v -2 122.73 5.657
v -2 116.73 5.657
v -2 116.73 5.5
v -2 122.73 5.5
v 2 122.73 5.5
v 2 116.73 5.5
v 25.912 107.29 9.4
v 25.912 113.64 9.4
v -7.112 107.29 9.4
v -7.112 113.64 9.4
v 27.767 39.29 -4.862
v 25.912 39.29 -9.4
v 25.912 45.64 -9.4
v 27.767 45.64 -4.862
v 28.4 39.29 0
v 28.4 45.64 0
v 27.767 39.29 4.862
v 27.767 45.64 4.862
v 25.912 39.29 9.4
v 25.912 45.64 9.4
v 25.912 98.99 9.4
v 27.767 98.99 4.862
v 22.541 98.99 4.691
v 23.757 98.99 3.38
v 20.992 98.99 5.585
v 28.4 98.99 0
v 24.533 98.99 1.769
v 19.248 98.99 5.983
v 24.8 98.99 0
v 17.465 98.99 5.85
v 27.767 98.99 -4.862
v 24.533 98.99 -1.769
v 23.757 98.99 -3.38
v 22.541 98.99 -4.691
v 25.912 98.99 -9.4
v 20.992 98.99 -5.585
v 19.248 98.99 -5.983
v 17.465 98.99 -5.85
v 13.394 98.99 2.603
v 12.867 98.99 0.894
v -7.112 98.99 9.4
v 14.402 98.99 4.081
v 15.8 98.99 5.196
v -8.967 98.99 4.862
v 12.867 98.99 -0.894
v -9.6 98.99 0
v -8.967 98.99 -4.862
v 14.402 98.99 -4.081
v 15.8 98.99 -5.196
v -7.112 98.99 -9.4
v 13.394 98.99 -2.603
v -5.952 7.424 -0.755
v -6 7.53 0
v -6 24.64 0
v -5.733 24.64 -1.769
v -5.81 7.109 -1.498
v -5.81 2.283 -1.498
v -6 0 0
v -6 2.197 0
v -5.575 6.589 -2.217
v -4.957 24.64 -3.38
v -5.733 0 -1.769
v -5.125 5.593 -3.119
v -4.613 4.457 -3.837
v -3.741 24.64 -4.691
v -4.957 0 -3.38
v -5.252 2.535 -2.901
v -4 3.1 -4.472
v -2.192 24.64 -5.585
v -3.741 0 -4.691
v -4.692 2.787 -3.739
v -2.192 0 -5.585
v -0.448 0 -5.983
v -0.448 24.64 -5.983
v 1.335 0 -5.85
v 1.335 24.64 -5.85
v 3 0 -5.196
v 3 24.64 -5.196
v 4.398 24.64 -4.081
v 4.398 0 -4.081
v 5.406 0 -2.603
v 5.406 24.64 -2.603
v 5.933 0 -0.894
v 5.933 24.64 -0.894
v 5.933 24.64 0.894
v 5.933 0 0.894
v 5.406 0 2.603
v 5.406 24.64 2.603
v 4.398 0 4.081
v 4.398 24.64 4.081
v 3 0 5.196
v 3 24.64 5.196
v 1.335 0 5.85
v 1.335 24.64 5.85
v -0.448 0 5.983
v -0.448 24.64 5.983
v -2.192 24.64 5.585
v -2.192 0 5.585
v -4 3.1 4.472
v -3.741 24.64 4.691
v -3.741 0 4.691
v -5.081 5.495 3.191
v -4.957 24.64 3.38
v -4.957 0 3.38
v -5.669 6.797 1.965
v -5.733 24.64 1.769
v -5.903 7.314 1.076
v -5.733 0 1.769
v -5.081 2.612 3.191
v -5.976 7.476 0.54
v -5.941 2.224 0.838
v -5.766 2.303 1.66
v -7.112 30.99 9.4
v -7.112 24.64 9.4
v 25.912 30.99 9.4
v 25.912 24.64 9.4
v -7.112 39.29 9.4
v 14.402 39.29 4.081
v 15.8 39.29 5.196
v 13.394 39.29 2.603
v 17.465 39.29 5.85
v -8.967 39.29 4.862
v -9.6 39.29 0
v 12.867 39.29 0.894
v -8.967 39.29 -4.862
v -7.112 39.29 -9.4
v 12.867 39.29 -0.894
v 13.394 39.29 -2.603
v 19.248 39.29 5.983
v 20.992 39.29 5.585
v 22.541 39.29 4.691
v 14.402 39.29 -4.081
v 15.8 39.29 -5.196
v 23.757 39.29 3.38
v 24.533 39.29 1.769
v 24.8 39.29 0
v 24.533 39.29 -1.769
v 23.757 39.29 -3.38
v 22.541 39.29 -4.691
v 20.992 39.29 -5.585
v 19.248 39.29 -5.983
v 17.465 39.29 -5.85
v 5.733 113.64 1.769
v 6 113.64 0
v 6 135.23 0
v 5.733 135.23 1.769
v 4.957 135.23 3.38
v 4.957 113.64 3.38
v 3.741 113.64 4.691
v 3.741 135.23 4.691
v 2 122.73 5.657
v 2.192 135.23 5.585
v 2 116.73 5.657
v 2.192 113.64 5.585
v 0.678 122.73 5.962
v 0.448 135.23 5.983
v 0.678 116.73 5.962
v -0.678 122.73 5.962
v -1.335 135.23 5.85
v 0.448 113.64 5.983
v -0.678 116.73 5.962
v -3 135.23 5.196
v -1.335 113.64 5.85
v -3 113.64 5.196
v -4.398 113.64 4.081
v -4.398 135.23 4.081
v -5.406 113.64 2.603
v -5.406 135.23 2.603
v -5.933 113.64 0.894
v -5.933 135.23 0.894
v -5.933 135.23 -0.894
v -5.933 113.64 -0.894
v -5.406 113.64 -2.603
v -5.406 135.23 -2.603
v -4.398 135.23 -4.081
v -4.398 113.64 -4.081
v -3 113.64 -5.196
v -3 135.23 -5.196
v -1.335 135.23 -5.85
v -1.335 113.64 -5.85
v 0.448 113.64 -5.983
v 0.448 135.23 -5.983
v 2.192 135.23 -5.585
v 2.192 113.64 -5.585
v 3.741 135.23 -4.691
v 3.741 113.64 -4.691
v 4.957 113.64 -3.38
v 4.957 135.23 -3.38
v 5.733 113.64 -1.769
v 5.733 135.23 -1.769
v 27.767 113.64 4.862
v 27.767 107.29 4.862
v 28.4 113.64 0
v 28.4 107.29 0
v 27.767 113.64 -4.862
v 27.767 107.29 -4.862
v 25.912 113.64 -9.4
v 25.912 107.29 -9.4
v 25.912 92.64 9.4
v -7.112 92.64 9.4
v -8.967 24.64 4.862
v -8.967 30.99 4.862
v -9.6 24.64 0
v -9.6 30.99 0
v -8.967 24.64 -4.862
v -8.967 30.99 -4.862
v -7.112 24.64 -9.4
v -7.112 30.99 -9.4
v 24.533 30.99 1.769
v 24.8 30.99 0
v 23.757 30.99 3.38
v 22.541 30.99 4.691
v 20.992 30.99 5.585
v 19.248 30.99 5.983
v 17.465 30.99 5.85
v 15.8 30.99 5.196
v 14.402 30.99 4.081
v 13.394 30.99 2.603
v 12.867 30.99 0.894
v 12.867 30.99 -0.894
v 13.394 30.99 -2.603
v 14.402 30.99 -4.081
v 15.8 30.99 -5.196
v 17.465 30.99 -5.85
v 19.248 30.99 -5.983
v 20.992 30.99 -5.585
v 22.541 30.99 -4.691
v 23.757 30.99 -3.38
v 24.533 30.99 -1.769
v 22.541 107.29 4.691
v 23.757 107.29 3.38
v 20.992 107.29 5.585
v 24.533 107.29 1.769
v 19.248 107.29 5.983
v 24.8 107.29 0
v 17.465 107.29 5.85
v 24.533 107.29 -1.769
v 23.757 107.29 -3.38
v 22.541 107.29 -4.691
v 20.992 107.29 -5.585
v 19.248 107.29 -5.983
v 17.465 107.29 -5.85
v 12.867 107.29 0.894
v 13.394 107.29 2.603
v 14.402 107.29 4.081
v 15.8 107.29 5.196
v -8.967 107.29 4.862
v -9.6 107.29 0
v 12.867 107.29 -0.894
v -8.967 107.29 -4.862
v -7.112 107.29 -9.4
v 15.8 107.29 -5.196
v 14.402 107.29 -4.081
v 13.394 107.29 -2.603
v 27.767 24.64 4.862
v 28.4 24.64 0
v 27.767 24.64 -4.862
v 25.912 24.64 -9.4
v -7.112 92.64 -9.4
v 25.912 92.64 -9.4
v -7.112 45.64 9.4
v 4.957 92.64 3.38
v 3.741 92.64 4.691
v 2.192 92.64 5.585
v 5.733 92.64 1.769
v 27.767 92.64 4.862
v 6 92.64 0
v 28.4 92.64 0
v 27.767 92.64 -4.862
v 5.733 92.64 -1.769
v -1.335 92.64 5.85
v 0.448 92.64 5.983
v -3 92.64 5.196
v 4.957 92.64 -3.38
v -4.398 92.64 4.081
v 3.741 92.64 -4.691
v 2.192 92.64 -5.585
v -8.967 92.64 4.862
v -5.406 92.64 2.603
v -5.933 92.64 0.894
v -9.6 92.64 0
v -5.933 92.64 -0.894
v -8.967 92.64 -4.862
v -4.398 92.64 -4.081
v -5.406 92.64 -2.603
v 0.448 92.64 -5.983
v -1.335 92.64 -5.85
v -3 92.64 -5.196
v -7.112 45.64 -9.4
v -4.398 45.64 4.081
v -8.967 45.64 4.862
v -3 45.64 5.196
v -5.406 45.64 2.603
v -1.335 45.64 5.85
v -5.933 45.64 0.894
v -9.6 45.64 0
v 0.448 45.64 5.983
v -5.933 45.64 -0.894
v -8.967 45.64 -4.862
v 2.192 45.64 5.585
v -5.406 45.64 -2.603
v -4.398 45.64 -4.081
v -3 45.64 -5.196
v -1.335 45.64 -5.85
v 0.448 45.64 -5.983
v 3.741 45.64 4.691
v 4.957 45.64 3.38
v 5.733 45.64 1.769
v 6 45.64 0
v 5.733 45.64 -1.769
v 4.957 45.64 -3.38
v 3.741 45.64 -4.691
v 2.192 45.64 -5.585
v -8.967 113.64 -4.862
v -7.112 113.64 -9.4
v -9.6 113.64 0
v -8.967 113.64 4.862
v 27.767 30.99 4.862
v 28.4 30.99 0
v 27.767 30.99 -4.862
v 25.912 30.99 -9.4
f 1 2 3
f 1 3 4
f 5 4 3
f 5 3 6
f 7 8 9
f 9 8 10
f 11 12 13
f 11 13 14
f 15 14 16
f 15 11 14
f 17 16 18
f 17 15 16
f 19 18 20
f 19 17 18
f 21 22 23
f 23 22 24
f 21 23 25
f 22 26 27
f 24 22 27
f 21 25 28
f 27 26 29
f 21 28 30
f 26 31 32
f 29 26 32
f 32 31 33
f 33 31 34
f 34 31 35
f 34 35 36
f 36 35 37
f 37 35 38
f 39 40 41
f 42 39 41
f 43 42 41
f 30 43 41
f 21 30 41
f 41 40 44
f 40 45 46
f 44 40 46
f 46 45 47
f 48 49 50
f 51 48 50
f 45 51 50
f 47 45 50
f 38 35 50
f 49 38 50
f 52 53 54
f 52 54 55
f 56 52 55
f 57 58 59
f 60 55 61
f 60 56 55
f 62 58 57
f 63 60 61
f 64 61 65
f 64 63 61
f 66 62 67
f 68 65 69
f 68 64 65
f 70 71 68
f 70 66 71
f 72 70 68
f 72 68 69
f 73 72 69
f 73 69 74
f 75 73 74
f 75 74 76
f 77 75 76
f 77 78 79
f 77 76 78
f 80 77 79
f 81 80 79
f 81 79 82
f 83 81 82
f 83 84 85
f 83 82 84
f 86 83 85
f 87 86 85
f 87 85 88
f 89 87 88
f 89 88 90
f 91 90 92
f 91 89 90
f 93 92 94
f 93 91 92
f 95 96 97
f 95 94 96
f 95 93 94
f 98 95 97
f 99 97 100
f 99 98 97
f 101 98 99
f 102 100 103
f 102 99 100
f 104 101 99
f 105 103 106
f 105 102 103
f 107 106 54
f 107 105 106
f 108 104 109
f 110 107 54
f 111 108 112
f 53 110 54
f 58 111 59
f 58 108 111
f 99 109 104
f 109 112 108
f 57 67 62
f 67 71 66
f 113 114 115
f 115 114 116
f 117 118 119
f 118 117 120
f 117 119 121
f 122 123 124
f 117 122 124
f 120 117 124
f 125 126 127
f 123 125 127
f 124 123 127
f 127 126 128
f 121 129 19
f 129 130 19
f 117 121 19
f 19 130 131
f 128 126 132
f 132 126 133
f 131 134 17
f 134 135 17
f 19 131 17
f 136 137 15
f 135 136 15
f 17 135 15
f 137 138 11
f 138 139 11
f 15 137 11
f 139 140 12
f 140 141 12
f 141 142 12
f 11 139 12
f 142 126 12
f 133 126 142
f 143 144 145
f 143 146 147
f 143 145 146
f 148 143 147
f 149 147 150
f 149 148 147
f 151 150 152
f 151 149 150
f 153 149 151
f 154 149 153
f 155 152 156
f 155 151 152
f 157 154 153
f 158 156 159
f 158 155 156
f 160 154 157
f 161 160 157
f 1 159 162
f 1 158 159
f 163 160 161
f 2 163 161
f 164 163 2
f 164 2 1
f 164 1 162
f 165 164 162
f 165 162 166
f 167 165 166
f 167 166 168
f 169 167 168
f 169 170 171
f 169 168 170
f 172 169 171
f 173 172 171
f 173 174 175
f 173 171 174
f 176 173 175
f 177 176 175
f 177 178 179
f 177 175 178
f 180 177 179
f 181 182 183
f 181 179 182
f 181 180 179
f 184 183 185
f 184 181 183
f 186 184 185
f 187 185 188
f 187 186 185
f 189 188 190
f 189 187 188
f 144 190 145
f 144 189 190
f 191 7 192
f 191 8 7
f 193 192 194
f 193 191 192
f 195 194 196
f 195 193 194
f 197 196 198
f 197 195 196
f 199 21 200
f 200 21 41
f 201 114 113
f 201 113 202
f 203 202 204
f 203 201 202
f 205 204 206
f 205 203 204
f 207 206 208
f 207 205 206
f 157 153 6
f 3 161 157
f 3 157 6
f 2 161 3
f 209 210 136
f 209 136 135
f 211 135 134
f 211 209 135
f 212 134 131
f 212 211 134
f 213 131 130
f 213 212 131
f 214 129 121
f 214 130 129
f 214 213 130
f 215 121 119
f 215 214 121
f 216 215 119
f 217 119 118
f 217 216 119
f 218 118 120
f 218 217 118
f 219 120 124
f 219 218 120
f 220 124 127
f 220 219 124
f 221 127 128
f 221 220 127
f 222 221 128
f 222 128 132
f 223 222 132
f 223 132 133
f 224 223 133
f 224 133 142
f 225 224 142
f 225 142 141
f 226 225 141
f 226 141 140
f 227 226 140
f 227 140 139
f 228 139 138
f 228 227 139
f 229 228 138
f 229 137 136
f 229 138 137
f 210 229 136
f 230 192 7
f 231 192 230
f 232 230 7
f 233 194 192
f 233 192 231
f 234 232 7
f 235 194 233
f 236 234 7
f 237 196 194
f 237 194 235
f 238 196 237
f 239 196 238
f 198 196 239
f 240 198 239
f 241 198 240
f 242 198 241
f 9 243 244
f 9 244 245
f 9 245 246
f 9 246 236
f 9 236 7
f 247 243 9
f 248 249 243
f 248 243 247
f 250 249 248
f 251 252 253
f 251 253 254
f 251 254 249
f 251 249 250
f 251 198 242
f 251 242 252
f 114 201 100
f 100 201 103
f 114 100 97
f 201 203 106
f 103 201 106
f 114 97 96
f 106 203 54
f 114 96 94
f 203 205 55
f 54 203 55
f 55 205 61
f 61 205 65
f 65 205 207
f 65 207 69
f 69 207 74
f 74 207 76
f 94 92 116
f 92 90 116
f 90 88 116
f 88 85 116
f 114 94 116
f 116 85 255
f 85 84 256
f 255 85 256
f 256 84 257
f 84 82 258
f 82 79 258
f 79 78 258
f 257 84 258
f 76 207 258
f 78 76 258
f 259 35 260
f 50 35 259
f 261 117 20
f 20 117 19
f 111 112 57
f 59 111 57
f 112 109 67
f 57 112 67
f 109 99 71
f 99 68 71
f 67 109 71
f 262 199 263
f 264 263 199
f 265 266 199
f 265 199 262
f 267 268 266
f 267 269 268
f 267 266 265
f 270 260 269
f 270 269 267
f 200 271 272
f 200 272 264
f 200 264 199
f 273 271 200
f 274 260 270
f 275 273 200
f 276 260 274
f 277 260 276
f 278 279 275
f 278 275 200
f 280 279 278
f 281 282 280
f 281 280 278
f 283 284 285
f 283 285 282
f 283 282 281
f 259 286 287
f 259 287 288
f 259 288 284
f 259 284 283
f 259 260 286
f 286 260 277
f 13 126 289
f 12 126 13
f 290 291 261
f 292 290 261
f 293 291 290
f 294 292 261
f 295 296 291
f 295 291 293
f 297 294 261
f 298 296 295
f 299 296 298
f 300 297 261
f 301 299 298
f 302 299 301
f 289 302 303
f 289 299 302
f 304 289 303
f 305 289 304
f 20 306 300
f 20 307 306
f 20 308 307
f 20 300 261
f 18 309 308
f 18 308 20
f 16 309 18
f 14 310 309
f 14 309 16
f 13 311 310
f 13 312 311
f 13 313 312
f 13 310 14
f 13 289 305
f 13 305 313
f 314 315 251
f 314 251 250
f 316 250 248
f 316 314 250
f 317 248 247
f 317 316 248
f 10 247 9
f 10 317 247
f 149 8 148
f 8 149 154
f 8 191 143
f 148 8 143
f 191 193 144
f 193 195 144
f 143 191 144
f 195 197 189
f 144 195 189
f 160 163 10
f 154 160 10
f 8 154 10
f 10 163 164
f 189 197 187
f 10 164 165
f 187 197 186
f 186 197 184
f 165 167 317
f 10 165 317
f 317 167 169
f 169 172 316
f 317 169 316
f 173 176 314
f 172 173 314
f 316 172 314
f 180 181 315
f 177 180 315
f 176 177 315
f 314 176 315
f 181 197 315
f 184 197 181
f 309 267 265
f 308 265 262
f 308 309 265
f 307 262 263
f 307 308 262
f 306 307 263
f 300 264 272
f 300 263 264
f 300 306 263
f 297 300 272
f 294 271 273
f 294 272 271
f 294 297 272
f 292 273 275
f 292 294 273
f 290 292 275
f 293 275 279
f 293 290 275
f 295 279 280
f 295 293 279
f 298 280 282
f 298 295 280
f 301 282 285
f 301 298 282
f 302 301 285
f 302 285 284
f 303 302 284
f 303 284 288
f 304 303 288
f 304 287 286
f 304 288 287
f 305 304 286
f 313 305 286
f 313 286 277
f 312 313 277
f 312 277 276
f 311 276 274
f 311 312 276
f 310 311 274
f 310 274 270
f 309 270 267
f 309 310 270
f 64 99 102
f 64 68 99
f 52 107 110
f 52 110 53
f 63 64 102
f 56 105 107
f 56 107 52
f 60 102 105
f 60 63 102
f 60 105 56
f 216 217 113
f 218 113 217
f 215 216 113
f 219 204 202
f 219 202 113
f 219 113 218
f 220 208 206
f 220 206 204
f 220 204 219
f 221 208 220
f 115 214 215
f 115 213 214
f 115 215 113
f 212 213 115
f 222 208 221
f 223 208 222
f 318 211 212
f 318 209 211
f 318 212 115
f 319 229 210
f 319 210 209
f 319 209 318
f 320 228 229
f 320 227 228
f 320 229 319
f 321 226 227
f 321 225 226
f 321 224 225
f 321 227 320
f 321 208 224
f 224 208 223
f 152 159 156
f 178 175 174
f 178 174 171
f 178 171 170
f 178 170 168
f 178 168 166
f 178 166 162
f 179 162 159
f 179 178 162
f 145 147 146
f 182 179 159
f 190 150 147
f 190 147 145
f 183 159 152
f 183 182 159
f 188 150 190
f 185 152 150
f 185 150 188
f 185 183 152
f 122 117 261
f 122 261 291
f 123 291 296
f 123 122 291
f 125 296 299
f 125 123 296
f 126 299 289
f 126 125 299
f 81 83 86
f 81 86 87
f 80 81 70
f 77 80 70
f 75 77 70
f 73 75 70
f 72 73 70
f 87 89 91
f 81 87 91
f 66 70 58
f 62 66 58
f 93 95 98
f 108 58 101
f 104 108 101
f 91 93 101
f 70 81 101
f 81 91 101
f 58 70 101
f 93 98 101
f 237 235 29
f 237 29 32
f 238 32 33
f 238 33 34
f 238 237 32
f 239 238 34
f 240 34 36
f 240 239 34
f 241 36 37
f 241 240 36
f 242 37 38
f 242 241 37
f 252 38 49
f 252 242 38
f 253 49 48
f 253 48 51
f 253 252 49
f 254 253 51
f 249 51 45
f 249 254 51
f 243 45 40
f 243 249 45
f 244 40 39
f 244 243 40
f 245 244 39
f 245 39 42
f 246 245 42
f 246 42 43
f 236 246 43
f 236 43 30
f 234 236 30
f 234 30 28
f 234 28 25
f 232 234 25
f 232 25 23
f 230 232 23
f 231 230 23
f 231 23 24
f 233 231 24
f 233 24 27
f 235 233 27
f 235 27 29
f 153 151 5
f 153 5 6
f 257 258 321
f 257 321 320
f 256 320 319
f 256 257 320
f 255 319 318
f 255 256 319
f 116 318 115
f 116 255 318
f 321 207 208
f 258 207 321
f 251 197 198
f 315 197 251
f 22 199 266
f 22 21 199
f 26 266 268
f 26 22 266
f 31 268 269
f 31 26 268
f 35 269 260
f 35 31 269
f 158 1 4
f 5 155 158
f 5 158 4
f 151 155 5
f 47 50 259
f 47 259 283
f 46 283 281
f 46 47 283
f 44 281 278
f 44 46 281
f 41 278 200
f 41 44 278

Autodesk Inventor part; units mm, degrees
ref_plane "YZ Plane" through (0, 0, 0) normal (1, 0, 0) x (0, 1, 0)
sketch "Sketch1" plane through (0, 0, 0) normal (0, 1, 0) x (-1, 0, 0)
  circle A0 centre (0, 0) radius 6
  dimension "d10" = 12
extrude "Extrusion1" add sketch "Sketch1" along normal blind 24.64
sketch "Sketch2" plane through (0, 24.64, 0) normal (0, 1, 0) x (1, 0, 0)
  line L0 (0, 0) -> (9.4, 0) construction
  line L1 (9.4, 0) -> (9.4, -9.4) construction
  line L2 (9.4, -9.4) -> (9.4, 9.4) construction
  line L3 (9.4, 9.4) -> (-7.1118, 9.4) construction
  line L4 (-7.1118, -9.4) -> (25.9118, -9.4)
  line L5 (-7.1118, 9.4) -> (25.9118, 9.4)
  arc A0 (-7.1118, 9.4) -> (-7.1118, -9.4) centre (9.4, 0) ccw
  arc A1 (25.9118, -9.4) -> (25.9118, 9.4) centre (9.4, 0) ccw
  dimension "d3" = 9.4
  dimension "d5" = 9.4
  dimension "d6" = 18.8
extrude "Extrusion2" add sketch "Sketch2" along normal blind 6.35
sketch "Sketch3" plane through (0, 30.99, 0) normal (0, 1, 0) x (1, 0, 0)
  arc A0 (25.9118, -9.4) -> (25.9118, 9.4) centre (9.4, 0) ccw construction
  line L0 (28.4, 0) -> (-9.6, 0) construction
  arc A1 (-7.1118, 9.4) -> (-7.1118, -9.4) centre (9.4, 0) ccw construction
  line L1 (9.4, 0) -> (18.8, 0) construction
  circle A2 centre (18.8, 0) radius 6
  point P0 (0, 0)
  dimension "d9" = 9.4
  dimension "d11" = 12
extrude "Extrusion3" add sketch "Sketch3" along normal blind 8.3
sketch "Sketch4" plane through (18.8, 39.29, 0) normal (0, 1, 0) x (1, 0, 0)
  line L0 (-18.8, 0) -> (-9.4, 0) construction
  line L1 (-25.9118, -9.4) -> (7.1118, -9.4) projected
  arc A0 (7.1118, -9.4) -> (7.1118, 9.4) centre (-9.4, 0) ccw projected
  line L2 (-25.9118, -9.4) -> (7.1118, -9.4)
  arc A1 (-25.9118, 9.4) -> (-25.9118, -9.4) centre (-9.4, 0) ccw projected
  line L3 (-25.9118, 9.4) -> (7.1118, 9.4)
  arc A2 (-25.9118, 9.4) -> (-25.9118, -9.4) centre (-8.6906, 0) ccw
  arc A3 (7.1118, -9.4) -> (7.1118, 9.4) centre (-9.4, 0) ccw
extrude "Extrusion4" add sketch "Sketch4" along normal blind 6.35
sketch "Sketch5" plane through (18.8, 45.64, 0) normal (0, 1, 0) x (1, 0, 0)
  circle A0 centre (-18.8, 0) radius 6
extrude "Extrusion5" add sketch "Sketch5" along normal blind 47
ref_plane "Work Plane1" through (0, 69.14, 0) normal (0, 1, 0) x (-1, 0, 0)
mirror "Mirror1" about plane through (0, 69.14, 0) normal (0, 1, 0) of "Extrusion4", "Extrusion3", "Extrusion2"
sketch "Sketch6" plane through (-7.1118, 113.64, -9.4) normal (0, 1, 0) x (1, 0, 0)
  circle A0 centre (7.1118, -9.4) radius 6
extrude "Extrusion6" add sketch "Sketch6" along normal blind 21.59
sketch "Sketch7" plane through (0, 0, 0) normal (0, 0, 1) x (1, 0, 0)
  line L0 (-6, 0) -> (6, 0) construction
  line L1 (-6, 0) -> (-6, 3.1) construction
  line L2 (-6, 0) -> (-6, 24.64) construction
  line L3 (-6, 3.1) -> (-6, 13.9633) construction
  line L4 (-6, 6.3213) -> (-6.1058, 6.6118) construction
  line L5 (-6, 6.3213) -> (-6, 12.9578) construction
  line L6 (-4, 3.1) -> (-6.1349, 7.8288)
  line L7 (-4, 3.1) -> (-2, 3.1) construction
  line L8 (-4, 3.1) -> (-6, 2.1971)
  line L9 (-6, 2.1971) -> (-6.1349, 7.8288)
  point P0 (0, 0)
extrude "Extrusion7" cut sketch "Sketch7" along normal through all both and the other way through all
ref_plane "Work Plane2" through (0, 0, 6) normal (0, 0, 1) x (1, 0, 0)
sketch "Sketch8" plane through (0, 0, 6) normal (0, 0, 1) x (1, 0, 0)
  line L0 (6, 135.23) -> (-6, 135.23) construction
  line L1 (0, 135.23) -> (0, 122.73) construction
  line L2 (0, 122.73) -> (0, 119.73) construction
  line L3 (2, 116.73) -> (-2, 116.73)
  line L4 (-2, 116.73) -> (-2, 122.73)
  line L5 (-2, 122.73) -> (2, 122.73)
  line L6 (2, 122.73) -> (2, 116.73)
  line L7 (2, 116.73) -> (-2, 122.73) construction
  line L8 (-2, 116.73) -> (2, 122.73) construction
  point P0 (0, 0)
  dimension "d29" = 12.5
  dimension "d30" = 3
  dimension "d31" = 4
extrude "Extrusion8" cut sketch "Sketch8" against normal blind 0.5
properties part number "Albero a gomito"
